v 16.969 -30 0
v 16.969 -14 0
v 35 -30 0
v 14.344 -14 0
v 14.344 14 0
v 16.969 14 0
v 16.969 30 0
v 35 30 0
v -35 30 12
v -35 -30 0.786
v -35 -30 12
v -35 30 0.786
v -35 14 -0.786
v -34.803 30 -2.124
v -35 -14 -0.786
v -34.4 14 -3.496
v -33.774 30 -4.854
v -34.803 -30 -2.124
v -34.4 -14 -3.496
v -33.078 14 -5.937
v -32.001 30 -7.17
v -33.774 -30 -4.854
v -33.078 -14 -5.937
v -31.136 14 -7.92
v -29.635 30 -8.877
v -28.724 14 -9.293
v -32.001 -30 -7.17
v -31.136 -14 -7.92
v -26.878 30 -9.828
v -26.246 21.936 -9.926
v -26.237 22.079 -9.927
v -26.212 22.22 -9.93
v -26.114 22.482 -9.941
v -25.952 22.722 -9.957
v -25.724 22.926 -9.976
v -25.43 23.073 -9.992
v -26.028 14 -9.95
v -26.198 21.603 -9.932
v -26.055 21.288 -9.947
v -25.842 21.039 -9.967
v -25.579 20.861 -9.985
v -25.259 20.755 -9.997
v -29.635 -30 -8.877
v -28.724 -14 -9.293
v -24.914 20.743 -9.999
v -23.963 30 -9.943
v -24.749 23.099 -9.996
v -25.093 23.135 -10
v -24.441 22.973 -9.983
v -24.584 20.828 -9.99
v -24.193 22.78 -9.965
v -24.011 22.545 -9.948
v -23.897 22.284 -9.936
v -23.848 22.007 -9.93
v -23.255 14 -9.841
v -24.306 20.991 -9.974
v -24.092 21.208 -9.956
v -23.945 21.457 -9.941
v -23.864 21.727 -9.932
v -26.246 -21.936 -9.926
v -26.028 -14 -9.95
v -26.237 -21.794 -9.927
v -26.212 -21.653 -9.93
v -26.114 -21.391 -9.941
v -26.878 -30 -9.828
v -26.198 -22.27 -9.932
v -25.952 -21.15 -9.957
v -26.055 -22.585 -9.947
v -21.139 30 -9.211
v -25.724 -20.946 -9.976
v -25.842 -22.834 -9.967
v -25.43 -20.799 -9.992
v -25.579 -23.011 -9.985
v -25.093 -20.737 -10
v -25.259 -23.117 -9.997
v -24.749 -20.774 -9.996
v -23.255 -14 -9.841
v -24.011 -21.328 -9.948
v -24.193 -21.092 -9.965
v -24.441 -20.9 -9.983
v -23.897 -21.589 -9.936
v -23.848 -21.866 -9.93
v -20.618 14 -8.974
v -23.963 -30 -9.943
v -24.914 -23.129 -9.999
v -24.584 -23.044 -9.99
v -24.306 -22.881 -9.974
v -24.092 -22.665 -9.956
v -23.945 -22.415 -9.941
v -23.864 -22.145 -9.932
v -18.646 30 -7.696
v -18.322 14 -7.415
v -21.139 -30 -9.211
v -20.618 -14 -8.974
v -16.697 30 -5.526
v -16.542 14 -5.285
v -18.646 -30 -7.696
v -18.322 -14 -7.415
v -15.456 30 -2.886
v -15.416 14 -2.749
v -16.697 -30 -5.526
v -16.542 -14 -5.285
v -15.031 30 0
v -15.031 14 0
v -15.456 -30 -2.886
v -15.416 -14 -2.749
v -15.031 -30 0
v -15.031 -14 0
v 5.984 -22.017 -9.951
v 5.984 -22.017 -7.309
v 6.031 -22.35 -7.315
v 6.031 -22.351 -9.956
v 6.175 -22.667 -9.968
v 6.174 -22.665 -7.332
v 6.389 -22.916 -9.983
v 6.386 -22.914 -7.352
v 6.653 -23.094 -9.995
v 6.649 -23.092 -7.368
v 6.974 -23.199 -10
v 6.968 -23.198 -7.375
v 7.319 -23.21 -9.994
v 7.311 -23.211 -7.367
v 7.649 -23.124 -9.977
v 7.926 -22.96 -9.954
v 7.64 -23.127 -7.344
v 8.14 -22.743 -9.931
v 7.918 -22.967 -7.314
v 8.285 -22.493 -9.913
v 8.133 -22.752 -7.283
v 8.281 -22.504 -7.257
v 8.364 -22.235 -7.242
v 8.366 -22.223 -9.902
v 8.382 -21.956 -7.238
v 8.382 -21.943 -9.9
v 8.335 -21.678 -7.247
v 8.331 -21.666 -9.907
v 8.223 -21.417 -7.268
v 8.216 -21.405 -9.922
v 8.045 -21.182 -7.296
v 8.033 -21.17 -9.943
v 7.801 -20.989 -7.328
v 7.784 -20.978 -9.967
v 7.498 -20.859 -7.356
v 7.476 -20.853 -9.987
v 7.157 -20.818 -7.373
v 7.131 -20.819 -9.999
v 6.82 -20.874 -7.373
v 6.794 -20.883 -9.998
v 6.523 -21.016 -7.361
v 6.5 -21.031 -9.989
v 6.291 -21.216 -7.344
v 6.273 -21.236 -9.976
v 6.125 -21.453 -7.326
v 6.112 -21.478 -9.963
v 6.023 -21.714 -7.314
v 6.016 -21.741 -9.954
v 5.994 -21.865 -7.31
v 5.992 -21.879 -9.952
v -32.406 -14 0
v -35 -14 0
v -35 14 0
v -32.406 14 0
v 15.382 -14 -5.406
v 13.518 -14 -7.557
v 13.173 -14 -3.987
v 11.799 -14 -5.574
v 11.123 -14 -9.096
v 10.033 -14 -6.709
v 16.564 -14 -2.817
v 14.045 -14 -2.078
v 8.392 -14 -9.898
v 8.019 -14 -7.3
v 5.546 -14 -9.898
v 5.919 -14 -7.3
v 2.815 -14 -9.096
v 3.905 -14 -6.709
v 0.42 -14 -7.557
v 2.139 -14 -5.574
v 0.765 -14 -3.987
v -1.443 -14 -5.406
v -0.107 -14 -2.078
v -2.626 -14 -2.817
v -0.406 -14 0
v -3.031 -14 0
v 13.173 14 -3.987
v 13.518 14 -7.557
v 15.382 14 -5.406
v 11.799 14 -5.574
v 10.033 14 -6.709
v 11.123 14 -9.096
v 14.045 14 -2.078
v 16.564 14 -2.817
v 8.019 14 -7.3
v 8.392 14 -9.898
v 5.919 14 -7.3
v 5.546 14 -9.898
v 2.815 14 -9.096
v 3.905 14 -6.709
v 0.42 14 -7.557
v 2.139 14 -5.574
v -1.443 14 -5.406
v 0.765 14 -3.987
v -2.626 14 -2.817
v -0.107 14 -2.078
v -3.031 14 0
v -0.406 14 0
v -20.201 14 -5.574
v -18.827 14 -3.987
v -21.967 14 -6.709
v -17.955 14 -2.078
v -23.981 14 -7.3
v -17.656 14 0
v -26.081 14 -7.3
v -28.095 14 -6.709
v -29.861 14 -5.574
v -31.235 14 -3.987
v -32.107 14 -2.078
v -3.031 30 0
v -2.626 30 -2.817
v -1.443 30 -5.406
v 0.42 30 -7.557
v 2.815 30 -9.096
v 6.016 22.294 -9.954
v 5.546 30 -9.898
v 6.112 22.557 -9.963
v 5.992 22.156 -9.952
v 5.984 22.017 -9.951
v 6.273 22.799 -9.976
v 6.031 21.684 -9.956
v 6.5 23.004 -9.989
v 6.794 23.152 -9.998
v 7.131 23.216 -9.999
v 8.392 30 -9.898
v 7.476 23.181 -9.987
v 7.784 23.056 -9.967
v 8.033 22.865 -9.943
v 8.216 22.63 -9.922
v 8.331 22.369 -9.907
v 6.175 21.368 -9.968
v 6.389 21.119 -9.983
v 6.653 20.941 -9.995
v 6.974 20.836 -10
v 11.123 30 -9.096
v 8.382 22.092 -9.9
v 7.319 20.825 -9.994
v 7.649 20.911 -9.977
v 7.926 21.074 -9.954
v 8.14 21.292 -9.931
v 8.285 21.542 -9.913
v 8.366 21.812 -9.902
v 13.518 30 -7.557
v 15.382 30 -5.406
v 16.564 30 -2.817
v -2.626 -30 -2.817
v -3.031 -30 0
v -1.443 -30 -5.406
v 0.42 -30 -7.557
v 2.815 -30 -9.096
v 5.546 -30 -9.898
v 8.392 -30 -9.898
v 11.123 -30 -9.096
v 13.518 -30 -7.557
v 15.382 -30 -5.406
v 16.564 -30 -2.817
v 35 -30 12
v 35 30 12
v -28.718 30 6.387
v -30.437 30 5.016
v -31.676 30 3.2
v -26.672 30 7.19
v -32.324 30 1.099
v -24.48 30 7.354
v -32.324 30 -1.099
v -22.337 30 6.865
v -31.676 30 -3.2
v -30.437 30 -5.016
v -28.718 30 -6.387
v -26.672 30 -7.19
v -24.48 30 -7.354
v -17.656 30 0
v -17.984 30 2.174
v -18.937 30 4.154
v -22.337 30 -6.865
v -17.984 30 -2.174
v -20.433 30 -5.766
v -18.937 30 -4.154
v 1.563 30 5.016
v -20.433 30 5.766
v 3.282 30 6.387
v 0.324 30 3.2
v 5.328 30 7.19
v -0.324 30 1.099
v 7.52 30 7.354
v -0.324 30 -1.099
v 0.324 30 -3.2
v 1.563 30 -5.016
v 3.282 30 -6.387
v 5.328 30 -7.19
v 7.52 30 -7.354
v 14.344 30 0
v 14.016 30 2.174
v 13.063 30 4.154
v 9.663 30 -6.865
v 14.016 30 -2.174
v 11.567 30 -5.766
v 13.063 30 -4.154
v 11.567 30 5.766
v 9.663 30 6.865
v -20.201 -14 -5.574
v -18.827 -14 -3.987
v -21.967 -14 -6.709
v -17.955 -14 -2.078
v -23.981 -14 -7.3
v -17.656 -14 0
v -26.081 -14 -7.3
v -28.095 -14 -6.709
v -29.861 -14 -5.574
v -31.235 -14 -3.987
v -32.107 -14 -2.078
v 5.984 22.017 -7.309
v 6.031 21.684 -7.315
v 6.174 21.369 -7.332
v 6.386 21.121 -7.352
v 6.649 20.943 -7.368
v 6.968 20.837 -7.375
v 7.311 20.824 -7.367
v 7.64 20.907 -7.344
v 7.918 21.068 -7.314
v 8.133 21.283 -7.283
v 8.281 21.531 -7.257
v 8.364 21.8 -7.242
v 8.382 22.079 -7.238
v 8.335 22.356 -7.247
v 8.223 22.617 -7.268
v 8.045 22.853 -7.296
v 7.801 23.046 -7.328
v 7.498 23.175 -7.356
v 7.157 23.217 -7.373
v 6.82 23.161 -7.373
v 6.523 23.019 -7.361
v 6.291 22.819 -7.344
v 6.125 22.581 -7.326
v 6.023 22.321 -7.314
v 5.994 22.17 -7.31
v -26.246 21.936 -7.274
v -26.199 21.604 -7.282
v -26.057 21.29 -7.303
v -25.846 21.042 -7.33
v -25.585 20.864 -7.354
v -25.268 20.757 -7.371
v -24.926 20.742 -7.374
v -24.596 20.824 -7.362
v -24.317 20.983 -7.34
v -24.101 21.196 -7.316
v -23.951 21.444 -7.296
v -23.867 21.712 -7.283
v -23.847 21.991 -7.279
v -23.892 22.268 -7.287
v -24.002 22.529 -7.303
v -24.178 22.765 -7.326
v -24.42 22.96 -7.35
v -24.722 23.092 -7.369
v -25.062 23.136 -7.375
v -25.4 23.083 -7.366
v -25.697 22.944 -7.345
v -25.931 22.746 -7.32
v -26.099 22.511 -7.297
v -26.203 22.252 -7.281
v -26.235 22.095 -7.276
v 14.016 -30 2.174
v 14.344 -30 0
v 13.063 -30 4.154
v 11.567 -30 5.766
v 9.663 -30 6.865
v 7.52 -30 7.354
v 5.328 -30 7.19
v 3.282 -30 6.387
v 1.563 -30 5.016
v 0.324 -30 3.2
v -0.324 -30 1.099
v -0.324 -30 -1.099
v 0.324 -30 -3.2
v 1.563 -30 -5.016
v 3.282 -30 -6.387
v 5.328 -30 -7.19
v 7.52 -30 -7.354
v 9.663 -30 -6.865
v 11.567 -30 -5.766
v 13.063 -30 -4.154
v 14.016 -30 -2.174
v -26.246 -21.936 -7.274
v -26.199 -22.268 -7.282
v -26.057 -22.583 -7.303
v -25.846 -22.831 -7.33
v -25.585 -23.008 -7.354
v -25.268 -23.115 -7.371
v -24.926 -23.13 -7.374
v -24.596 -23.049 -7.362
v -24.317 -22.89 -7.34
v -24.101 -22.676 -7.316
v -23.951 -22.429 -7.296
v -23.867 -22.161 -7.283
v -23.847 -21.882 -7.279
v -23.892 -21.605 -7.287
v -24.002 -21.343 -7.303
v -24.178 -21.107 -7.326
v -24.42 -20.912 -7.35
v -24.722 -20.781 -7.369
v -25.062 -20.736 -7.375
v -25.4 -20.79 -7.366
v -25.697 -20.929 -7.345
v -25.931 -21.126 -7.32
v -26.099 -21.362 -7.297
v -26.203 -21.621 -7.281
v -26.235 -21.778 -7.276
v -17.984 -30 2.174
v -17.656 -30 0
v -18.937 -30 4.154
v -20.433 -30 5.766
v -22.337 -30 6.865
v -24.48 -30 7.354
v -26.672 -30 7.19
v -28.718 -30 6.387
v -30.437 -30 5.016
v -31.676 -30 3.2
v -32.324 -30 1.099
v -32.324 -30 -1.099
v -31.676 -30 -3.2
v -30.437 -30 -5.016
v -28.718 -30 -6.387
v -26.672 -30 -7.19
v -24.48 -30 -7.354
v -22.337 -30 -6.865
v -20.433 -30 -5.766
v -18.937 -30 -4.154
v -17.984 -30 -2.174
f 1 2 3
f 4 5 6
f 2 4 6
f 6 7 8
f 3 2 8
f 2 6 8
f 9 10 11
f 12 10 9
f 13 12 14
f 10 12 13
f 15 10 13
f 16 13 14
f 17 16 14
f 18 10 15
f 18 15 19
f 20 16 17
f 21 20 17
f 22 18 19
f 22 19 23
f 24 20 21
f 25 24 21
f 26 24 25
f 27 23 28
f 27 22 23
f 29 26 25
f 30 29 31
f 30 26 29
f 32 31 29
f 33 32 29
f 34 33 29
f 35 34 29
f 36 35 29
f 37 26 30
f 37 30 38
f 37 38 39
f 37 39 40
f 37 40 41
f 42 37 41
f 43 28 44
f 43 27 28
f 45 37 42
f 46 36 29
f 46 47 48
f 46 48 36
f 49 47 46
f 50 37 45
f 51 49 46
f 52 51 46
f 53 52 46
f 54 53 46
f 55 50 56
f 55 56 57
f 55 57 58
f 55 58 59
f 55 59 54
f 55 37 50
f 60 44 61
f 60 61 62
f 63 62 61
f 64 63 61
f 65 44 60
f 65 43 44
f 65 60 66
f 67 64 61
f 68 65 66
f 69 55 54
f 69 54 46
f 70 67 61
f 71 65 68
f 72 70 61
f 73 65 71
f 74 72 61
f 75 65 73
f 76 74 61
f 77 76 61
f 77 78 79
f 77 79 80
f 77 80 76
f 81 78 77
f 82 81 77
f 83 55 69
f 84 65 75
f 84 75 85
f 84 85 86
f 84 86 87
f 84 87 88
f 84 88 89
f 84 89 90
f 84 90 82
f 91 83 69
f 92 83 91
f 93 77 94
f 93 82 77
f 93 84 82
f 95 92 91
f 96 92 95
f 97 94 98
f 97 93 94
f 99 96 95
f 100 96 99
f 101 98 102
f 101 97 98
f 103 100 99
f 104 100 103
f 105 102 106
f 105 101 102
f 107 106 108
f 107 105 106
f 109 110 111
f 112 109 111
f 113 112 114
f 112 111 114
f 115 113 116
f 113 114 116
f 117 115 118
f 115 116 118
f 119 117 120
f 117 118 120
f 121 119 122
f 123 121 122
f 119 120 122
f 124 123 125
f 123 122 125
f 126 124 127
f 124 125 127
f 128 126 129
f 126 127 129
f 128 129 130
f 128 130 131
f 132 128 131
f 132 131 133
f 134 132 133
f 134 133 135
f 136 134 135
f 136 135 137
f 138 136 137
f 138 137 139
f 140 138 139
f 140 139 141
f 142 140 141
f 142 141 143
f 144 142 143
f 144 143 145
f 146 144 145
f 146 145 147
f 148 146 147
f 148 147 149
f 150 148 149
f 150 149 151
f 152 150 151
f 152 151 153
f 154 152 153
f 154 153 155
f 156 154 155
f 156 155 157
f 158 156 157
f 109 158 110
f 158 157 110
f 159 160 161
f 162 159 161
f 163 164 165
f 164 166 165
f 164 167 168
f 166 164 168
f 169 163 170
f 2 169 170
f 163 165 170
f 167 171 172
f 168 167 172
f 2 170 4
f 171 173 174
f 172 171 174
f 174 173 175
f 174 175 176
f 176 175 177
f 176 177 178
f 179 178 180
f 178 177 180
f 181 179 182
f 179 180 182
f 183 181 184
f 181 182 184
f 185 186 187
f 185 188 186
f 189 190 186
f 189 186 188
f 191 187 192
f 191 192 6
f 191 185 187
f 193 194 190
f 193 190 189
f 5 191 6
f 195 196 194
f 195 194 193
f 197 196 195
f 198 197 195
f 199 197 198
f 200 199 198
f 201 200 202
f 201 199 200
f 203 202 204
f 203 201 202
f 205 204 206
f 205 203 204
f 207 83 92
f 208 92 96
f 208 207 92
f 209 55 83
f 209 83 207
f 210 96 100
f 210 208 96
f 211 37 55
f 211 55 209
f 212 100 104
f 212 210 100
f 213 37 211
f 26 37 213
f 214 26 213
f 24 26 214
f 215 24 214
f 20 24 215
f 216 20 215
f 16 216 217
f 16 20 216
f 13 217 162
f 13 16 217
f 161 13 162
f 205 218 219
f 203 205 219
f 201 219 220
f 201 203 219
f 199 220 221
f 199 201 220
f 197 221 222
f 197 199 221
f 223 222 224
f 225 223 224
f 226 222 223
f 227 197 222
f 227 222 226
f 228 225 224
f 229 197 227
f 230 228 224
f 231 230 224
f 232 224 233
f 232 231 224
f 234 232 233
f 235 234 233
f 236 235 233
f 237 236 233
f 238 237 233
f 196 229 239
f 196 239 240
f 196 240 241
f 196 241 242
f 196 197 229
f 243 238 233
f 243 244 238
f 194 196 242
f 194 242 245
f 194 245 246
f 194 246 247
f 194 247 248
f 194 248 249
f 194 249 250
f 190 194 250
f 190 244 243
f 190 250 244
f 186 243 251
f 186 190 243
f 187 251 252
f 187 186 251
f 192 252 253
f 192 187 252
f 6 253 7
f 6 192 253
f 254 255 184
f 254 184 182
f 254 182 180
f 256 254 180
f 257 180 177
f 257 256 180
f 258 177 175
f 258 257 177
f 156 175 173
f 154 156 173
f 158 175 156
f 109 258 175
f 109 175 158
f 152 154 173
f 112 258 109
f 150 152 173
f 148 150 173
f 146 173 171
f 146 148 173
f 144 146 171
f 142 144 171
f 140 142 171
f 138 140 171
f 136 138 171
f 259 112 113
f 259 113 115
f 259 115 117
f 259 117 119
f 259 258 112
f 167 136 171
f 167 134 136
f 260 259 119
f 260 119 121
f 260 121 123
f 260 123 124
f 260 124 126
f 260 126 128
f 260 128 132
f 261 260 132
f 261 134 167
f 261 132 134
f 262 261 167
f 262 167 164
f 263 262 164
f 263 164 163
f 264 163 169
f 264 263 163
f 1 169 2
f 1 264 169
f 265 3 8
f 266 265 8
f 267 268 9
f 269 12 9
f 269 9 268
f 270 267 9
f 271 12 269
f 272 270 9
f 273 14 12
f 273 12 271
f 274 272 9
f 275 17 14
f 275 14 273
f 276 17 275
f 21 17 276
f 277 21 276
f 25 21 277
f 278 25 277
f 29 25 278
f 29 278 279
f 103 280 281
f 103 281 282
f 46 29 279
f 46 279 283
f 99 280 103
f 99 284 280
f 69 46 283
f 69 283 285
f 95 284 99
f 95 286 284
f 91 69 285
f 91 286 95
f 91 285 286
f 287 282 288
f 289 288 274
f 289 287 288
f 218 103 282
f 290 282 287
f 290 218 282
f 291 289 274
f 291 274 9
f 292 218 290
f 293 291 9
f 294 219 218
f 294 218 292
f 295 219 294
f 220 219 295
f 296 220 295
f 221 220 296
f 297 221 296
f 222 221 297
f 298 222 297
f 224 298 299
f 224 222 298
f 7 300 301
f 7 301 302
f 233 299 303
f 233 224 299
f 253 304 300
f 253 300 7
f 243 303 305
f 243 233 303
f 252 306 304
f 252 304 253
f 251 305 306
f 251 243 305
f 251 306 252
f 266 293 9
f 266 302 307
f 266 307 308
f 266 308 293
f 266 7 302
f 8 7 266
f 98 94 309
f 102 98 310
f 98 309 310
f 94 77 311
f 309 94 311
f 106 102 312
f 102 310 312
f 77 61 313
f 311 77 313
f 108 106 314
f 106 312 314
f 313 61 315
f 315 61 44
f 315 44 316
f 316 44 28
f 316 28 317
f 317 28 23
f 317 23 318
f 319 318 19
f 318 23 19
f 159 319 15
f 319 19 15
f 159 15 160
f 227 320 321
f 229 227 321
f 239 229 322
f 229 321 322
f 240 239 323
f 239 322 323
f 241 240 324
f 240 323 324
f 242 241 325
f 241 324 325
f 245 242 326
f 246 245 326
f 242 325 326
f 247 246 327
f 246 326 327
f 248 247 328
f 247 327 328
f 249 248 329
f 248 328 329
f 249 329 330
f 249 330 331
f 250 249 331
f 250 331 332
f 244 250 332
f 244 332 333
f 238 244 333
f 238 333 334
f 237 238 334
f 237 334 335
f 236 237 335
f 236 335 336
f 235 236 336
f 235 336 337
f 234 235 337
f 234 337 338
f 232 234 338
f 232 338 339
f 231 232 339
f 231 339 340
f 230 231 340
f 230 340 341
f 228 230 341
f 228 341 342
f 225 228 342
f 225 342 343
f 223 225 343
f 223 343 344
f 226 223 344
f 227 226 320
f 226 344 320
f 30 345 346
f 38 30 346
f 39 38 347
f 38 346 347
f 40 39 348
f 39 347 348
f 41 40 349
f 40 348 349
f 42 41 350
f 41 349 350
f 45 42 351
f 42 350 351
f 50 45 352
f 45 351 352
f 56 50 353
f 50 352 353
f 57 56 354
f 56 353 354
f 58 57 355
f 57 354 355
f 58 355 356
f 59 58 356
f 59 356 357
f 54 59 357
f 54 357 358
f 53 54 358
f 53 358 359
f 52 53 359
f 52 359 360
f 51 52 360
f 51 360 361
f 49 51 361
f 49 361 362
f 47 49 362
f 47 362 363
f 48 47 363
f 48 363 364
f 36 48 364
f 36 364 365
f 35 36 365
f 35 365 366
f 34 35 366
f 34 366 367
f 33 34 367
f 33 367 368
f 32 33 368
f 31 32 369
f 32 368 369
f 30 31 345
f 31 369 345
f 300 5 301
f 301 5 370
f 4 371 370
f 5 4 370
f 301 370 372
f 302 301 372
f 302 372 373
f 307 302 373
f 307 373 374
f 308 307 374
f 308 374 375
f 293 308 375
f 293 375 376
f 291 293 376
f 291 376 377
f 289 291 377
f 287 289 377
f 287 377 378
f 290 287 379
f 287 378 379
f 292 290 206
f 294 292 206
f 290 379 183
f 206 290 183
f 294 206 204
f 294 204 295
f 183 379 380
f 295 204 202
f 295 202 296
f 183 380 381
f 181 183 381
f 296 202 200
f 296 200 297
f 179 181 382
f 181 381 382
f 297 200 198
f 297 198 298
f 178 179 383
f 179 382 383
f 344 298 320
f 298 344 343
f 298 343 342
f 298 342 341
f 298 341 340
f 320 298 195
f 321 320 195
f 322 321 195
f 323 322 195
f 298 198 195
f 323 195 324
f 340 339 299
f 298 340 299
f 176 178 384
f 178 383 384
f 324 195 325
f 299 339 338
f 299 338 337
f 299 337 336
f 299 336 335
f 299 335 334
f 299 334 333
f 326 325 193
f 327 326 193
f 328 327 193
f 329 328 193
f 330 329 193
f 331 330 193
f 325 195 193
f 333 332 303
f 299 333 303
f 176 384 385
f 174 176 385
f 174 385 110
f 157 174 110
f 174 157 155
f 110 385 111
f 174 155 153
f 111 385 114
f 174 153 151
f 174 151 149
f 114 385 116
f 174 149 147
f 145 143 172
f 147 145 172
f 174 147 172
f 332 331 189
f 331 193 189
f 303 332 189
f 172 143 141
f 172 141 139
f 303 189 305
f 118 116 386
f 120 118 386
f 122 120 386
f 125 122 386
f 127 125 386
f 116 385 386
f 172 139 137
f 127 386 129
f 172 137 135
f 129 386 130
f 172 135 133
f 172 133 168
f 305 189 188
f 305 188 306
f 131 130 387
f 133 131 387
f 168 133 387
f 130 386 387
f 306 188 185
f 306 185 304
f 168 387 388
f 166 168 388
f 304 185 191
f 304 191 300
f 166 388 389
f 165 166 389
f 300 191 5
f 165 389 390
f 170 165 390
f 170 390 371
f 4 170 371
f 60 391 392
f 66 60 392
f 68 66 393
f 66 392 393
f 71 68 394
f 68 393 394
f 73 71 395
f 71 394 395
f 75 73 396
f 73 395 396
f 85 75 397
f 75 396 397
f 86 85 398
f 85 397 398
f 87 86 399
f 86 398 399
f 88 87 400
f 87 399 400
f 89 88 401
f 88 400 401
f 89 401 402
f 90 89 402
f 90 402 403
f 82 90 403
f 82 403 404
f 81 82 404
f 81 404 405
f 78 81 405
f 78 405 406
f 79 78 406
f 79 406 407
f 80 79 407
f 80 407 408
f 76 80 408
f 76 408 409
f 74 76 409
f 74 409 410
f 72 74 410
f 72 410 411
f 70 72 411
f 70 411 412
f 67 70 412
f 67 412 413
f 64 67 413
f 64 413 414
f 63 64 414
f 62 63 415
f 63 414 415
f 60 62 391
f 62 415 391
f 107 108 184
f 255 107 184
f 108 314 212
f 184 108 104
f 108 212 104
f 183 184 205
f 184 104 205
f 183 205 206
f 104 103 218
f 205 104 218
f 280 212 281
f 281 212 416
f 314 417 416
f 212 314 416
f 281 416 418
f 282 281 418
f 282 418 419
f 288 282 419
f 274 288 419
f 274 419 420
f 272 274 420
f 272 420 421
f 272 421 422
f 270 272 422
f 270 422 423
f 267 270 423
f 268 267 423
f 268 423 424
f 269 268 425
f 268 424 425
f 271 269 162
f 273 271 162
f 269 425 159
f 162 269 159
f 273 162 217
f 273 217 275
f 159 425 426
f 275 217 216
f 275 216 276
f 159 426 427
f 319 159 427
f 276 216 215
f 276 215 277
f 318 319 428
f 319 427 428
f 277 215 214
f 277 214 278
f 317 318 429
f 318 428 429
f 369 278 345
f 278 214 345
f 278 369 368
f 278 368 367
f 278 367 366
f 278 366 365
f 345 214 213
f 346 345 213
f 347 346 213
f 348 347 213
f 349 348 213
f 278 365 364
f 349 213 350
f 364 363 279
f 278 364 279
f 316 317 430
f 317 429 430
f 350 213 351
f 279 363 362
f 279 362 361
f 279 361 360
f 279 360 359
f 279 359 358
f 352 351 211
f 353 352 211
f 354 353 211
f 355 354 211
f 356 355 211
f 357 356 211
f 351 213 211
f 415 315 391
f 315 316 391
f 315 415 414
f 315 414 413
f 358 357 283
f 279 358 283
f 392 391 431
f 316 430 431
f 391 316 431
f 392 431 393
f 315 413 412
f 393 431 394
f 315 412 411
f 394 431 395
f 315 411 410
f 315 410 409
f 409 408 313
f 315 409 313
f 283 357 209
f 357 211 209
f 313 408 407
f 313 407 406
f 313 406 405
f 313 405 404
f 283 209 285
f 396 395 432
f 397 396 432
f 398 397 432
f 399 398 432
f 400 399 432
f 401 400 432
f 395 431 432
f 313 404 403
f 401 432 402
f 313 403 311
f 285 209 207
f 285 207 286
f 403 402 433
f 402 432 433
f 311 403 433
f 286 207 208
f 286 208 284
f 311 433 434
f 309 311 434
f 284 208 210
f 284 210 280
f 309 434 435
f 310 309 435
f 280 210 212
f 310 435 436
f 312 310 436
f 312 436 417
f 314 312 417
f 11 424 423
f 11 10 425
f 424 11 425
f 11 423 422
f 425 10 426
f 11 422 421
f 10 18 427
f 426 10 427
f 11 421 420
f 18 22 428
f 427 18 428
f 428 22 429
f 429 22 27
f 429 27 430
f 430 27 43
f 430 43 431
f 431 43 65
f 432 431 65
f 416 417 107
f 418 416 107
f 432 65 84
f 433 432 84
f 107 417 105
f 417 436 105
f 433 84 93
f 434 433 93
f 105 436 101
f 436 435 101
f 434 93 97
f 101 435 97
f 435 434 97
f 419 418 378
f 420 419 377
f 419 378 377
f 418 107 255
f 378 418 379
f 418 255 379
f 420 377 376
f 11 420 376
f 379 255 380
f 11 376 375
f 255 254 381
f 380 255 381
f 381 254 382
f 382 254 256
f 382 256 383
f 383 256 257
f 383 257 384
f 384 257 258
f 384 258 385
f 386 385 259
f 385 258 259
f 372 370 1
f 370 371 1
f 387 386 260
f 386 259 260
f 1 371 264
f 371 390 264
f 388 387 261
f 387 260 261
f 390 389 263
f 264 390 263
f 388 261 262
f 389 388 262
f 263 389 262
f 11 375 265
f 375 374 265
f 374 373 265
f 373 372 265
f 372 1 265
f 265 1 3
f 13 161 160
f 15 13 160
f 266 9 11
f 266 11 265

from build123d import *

# Parameters (mm, degrees)
F0_W        = 70
F0_H        = 60
F1_DEPTH    = 12
F3_DEPTH    = 60.001
F2_R        = 10
F2_R_2      = 7.375
F4_DEPTH    = 60
F6_W        = 14
F6_H        = 16.388628301
F7_DEPTH    = 70.001
F10_D       = 2.4
F10_DEPTH   = 10
F10_START   = 0.0740526
F10_START_2 = 0.1005893
F10_TIP     = 0.7210327428


with BuildPart() as f1:
    # F0 (on Top) → F1 (new body)
    with BuildSketch(Plane.XY):
        Rectangle(F0_W, F0_H)
    extrude(amount=F1_DEPTH)

    # F2 (on face) → F3 (cut, through all)
    with BuildSketch(Plane.XZ.offset(30)):
        with BuildLine():
            Line((-32.4059612602, 0), (-17.6559612602, 0))
            ThreePointArc((-17.6559612602, 0), (-25.0309612602, 7.375), (-32.4059612602, 0))
        make_face()
        with BuildLine():
            ThreePointArc((14.3440387398, 0), (6.9690387398, 7.375), (-0.4059612602, 0))
            Line((-0.4059612602, 0), (14.3440387398, 0))
        make_face()
    extrude(amount=-F3_DEPTH, mode=Mode.SUBTRACT)

    # F2 (on face) → F4 (join, through all)
    with BuildSketch(Plane.XZ.offset(30)):
        with Locations((-25.0309612602, 0)):
            Circle(F2_R)
        with Locations((-25.0309612602, 0)):
            Circle(F2_R_2, mode=Mode.SUBTRACT)
        with Locations((6.9690387398, 0)):
            Circle(F2_R)
        with Locations((6.9690387398, 0)):
            Circle(F2_R_2, mode=Mode.SUBTRACT)
    extrude(amount=-F4_DEPTH)

    # F6 (on offset) → F7 (cut, through all)
    with BuildSketch(Plane(origin=(-35, 0, 0), x_dir=(0, -1, 0), z_dir=(-1, 0, 0))):
        with Locations((-7, -8.1943141505)):
            Rectangle(F6_W, F6_H)
        with Locations((7, -8.1943141505)):
            Rectangle(F6_W, F6_H)
    extrude(amount=-F7_DEPTH, mode=Mode.SUBTRACT)

    # F10
    # its depths count from where the whole tool has entered the part; down to there all is cleared
    with Locations(Plane(origin=(0, 0, -10), x_dir=(1, 0, 0), z_dir=(0, 0, -1))):
        with Locations((-25.0456897311, -21.936209172, -F10_START), (7.1838408707, -22.0174100382, -F10_START_2), (7.1838408707, 22.0174100382, -F10_START_2), (-25.0456897311, 21.936209172, -F10_START)):
            Hole(F10_D / 2, depth=F10_DEPTH)
            with Locations((0, 0, -(F10_DEPTH + F10_TIP / 2))):  # 118° drill point
                Cone(0, F10_D / 2, F10_TIP, mode=Mode.SUBTRACT)


solid = f1.part
